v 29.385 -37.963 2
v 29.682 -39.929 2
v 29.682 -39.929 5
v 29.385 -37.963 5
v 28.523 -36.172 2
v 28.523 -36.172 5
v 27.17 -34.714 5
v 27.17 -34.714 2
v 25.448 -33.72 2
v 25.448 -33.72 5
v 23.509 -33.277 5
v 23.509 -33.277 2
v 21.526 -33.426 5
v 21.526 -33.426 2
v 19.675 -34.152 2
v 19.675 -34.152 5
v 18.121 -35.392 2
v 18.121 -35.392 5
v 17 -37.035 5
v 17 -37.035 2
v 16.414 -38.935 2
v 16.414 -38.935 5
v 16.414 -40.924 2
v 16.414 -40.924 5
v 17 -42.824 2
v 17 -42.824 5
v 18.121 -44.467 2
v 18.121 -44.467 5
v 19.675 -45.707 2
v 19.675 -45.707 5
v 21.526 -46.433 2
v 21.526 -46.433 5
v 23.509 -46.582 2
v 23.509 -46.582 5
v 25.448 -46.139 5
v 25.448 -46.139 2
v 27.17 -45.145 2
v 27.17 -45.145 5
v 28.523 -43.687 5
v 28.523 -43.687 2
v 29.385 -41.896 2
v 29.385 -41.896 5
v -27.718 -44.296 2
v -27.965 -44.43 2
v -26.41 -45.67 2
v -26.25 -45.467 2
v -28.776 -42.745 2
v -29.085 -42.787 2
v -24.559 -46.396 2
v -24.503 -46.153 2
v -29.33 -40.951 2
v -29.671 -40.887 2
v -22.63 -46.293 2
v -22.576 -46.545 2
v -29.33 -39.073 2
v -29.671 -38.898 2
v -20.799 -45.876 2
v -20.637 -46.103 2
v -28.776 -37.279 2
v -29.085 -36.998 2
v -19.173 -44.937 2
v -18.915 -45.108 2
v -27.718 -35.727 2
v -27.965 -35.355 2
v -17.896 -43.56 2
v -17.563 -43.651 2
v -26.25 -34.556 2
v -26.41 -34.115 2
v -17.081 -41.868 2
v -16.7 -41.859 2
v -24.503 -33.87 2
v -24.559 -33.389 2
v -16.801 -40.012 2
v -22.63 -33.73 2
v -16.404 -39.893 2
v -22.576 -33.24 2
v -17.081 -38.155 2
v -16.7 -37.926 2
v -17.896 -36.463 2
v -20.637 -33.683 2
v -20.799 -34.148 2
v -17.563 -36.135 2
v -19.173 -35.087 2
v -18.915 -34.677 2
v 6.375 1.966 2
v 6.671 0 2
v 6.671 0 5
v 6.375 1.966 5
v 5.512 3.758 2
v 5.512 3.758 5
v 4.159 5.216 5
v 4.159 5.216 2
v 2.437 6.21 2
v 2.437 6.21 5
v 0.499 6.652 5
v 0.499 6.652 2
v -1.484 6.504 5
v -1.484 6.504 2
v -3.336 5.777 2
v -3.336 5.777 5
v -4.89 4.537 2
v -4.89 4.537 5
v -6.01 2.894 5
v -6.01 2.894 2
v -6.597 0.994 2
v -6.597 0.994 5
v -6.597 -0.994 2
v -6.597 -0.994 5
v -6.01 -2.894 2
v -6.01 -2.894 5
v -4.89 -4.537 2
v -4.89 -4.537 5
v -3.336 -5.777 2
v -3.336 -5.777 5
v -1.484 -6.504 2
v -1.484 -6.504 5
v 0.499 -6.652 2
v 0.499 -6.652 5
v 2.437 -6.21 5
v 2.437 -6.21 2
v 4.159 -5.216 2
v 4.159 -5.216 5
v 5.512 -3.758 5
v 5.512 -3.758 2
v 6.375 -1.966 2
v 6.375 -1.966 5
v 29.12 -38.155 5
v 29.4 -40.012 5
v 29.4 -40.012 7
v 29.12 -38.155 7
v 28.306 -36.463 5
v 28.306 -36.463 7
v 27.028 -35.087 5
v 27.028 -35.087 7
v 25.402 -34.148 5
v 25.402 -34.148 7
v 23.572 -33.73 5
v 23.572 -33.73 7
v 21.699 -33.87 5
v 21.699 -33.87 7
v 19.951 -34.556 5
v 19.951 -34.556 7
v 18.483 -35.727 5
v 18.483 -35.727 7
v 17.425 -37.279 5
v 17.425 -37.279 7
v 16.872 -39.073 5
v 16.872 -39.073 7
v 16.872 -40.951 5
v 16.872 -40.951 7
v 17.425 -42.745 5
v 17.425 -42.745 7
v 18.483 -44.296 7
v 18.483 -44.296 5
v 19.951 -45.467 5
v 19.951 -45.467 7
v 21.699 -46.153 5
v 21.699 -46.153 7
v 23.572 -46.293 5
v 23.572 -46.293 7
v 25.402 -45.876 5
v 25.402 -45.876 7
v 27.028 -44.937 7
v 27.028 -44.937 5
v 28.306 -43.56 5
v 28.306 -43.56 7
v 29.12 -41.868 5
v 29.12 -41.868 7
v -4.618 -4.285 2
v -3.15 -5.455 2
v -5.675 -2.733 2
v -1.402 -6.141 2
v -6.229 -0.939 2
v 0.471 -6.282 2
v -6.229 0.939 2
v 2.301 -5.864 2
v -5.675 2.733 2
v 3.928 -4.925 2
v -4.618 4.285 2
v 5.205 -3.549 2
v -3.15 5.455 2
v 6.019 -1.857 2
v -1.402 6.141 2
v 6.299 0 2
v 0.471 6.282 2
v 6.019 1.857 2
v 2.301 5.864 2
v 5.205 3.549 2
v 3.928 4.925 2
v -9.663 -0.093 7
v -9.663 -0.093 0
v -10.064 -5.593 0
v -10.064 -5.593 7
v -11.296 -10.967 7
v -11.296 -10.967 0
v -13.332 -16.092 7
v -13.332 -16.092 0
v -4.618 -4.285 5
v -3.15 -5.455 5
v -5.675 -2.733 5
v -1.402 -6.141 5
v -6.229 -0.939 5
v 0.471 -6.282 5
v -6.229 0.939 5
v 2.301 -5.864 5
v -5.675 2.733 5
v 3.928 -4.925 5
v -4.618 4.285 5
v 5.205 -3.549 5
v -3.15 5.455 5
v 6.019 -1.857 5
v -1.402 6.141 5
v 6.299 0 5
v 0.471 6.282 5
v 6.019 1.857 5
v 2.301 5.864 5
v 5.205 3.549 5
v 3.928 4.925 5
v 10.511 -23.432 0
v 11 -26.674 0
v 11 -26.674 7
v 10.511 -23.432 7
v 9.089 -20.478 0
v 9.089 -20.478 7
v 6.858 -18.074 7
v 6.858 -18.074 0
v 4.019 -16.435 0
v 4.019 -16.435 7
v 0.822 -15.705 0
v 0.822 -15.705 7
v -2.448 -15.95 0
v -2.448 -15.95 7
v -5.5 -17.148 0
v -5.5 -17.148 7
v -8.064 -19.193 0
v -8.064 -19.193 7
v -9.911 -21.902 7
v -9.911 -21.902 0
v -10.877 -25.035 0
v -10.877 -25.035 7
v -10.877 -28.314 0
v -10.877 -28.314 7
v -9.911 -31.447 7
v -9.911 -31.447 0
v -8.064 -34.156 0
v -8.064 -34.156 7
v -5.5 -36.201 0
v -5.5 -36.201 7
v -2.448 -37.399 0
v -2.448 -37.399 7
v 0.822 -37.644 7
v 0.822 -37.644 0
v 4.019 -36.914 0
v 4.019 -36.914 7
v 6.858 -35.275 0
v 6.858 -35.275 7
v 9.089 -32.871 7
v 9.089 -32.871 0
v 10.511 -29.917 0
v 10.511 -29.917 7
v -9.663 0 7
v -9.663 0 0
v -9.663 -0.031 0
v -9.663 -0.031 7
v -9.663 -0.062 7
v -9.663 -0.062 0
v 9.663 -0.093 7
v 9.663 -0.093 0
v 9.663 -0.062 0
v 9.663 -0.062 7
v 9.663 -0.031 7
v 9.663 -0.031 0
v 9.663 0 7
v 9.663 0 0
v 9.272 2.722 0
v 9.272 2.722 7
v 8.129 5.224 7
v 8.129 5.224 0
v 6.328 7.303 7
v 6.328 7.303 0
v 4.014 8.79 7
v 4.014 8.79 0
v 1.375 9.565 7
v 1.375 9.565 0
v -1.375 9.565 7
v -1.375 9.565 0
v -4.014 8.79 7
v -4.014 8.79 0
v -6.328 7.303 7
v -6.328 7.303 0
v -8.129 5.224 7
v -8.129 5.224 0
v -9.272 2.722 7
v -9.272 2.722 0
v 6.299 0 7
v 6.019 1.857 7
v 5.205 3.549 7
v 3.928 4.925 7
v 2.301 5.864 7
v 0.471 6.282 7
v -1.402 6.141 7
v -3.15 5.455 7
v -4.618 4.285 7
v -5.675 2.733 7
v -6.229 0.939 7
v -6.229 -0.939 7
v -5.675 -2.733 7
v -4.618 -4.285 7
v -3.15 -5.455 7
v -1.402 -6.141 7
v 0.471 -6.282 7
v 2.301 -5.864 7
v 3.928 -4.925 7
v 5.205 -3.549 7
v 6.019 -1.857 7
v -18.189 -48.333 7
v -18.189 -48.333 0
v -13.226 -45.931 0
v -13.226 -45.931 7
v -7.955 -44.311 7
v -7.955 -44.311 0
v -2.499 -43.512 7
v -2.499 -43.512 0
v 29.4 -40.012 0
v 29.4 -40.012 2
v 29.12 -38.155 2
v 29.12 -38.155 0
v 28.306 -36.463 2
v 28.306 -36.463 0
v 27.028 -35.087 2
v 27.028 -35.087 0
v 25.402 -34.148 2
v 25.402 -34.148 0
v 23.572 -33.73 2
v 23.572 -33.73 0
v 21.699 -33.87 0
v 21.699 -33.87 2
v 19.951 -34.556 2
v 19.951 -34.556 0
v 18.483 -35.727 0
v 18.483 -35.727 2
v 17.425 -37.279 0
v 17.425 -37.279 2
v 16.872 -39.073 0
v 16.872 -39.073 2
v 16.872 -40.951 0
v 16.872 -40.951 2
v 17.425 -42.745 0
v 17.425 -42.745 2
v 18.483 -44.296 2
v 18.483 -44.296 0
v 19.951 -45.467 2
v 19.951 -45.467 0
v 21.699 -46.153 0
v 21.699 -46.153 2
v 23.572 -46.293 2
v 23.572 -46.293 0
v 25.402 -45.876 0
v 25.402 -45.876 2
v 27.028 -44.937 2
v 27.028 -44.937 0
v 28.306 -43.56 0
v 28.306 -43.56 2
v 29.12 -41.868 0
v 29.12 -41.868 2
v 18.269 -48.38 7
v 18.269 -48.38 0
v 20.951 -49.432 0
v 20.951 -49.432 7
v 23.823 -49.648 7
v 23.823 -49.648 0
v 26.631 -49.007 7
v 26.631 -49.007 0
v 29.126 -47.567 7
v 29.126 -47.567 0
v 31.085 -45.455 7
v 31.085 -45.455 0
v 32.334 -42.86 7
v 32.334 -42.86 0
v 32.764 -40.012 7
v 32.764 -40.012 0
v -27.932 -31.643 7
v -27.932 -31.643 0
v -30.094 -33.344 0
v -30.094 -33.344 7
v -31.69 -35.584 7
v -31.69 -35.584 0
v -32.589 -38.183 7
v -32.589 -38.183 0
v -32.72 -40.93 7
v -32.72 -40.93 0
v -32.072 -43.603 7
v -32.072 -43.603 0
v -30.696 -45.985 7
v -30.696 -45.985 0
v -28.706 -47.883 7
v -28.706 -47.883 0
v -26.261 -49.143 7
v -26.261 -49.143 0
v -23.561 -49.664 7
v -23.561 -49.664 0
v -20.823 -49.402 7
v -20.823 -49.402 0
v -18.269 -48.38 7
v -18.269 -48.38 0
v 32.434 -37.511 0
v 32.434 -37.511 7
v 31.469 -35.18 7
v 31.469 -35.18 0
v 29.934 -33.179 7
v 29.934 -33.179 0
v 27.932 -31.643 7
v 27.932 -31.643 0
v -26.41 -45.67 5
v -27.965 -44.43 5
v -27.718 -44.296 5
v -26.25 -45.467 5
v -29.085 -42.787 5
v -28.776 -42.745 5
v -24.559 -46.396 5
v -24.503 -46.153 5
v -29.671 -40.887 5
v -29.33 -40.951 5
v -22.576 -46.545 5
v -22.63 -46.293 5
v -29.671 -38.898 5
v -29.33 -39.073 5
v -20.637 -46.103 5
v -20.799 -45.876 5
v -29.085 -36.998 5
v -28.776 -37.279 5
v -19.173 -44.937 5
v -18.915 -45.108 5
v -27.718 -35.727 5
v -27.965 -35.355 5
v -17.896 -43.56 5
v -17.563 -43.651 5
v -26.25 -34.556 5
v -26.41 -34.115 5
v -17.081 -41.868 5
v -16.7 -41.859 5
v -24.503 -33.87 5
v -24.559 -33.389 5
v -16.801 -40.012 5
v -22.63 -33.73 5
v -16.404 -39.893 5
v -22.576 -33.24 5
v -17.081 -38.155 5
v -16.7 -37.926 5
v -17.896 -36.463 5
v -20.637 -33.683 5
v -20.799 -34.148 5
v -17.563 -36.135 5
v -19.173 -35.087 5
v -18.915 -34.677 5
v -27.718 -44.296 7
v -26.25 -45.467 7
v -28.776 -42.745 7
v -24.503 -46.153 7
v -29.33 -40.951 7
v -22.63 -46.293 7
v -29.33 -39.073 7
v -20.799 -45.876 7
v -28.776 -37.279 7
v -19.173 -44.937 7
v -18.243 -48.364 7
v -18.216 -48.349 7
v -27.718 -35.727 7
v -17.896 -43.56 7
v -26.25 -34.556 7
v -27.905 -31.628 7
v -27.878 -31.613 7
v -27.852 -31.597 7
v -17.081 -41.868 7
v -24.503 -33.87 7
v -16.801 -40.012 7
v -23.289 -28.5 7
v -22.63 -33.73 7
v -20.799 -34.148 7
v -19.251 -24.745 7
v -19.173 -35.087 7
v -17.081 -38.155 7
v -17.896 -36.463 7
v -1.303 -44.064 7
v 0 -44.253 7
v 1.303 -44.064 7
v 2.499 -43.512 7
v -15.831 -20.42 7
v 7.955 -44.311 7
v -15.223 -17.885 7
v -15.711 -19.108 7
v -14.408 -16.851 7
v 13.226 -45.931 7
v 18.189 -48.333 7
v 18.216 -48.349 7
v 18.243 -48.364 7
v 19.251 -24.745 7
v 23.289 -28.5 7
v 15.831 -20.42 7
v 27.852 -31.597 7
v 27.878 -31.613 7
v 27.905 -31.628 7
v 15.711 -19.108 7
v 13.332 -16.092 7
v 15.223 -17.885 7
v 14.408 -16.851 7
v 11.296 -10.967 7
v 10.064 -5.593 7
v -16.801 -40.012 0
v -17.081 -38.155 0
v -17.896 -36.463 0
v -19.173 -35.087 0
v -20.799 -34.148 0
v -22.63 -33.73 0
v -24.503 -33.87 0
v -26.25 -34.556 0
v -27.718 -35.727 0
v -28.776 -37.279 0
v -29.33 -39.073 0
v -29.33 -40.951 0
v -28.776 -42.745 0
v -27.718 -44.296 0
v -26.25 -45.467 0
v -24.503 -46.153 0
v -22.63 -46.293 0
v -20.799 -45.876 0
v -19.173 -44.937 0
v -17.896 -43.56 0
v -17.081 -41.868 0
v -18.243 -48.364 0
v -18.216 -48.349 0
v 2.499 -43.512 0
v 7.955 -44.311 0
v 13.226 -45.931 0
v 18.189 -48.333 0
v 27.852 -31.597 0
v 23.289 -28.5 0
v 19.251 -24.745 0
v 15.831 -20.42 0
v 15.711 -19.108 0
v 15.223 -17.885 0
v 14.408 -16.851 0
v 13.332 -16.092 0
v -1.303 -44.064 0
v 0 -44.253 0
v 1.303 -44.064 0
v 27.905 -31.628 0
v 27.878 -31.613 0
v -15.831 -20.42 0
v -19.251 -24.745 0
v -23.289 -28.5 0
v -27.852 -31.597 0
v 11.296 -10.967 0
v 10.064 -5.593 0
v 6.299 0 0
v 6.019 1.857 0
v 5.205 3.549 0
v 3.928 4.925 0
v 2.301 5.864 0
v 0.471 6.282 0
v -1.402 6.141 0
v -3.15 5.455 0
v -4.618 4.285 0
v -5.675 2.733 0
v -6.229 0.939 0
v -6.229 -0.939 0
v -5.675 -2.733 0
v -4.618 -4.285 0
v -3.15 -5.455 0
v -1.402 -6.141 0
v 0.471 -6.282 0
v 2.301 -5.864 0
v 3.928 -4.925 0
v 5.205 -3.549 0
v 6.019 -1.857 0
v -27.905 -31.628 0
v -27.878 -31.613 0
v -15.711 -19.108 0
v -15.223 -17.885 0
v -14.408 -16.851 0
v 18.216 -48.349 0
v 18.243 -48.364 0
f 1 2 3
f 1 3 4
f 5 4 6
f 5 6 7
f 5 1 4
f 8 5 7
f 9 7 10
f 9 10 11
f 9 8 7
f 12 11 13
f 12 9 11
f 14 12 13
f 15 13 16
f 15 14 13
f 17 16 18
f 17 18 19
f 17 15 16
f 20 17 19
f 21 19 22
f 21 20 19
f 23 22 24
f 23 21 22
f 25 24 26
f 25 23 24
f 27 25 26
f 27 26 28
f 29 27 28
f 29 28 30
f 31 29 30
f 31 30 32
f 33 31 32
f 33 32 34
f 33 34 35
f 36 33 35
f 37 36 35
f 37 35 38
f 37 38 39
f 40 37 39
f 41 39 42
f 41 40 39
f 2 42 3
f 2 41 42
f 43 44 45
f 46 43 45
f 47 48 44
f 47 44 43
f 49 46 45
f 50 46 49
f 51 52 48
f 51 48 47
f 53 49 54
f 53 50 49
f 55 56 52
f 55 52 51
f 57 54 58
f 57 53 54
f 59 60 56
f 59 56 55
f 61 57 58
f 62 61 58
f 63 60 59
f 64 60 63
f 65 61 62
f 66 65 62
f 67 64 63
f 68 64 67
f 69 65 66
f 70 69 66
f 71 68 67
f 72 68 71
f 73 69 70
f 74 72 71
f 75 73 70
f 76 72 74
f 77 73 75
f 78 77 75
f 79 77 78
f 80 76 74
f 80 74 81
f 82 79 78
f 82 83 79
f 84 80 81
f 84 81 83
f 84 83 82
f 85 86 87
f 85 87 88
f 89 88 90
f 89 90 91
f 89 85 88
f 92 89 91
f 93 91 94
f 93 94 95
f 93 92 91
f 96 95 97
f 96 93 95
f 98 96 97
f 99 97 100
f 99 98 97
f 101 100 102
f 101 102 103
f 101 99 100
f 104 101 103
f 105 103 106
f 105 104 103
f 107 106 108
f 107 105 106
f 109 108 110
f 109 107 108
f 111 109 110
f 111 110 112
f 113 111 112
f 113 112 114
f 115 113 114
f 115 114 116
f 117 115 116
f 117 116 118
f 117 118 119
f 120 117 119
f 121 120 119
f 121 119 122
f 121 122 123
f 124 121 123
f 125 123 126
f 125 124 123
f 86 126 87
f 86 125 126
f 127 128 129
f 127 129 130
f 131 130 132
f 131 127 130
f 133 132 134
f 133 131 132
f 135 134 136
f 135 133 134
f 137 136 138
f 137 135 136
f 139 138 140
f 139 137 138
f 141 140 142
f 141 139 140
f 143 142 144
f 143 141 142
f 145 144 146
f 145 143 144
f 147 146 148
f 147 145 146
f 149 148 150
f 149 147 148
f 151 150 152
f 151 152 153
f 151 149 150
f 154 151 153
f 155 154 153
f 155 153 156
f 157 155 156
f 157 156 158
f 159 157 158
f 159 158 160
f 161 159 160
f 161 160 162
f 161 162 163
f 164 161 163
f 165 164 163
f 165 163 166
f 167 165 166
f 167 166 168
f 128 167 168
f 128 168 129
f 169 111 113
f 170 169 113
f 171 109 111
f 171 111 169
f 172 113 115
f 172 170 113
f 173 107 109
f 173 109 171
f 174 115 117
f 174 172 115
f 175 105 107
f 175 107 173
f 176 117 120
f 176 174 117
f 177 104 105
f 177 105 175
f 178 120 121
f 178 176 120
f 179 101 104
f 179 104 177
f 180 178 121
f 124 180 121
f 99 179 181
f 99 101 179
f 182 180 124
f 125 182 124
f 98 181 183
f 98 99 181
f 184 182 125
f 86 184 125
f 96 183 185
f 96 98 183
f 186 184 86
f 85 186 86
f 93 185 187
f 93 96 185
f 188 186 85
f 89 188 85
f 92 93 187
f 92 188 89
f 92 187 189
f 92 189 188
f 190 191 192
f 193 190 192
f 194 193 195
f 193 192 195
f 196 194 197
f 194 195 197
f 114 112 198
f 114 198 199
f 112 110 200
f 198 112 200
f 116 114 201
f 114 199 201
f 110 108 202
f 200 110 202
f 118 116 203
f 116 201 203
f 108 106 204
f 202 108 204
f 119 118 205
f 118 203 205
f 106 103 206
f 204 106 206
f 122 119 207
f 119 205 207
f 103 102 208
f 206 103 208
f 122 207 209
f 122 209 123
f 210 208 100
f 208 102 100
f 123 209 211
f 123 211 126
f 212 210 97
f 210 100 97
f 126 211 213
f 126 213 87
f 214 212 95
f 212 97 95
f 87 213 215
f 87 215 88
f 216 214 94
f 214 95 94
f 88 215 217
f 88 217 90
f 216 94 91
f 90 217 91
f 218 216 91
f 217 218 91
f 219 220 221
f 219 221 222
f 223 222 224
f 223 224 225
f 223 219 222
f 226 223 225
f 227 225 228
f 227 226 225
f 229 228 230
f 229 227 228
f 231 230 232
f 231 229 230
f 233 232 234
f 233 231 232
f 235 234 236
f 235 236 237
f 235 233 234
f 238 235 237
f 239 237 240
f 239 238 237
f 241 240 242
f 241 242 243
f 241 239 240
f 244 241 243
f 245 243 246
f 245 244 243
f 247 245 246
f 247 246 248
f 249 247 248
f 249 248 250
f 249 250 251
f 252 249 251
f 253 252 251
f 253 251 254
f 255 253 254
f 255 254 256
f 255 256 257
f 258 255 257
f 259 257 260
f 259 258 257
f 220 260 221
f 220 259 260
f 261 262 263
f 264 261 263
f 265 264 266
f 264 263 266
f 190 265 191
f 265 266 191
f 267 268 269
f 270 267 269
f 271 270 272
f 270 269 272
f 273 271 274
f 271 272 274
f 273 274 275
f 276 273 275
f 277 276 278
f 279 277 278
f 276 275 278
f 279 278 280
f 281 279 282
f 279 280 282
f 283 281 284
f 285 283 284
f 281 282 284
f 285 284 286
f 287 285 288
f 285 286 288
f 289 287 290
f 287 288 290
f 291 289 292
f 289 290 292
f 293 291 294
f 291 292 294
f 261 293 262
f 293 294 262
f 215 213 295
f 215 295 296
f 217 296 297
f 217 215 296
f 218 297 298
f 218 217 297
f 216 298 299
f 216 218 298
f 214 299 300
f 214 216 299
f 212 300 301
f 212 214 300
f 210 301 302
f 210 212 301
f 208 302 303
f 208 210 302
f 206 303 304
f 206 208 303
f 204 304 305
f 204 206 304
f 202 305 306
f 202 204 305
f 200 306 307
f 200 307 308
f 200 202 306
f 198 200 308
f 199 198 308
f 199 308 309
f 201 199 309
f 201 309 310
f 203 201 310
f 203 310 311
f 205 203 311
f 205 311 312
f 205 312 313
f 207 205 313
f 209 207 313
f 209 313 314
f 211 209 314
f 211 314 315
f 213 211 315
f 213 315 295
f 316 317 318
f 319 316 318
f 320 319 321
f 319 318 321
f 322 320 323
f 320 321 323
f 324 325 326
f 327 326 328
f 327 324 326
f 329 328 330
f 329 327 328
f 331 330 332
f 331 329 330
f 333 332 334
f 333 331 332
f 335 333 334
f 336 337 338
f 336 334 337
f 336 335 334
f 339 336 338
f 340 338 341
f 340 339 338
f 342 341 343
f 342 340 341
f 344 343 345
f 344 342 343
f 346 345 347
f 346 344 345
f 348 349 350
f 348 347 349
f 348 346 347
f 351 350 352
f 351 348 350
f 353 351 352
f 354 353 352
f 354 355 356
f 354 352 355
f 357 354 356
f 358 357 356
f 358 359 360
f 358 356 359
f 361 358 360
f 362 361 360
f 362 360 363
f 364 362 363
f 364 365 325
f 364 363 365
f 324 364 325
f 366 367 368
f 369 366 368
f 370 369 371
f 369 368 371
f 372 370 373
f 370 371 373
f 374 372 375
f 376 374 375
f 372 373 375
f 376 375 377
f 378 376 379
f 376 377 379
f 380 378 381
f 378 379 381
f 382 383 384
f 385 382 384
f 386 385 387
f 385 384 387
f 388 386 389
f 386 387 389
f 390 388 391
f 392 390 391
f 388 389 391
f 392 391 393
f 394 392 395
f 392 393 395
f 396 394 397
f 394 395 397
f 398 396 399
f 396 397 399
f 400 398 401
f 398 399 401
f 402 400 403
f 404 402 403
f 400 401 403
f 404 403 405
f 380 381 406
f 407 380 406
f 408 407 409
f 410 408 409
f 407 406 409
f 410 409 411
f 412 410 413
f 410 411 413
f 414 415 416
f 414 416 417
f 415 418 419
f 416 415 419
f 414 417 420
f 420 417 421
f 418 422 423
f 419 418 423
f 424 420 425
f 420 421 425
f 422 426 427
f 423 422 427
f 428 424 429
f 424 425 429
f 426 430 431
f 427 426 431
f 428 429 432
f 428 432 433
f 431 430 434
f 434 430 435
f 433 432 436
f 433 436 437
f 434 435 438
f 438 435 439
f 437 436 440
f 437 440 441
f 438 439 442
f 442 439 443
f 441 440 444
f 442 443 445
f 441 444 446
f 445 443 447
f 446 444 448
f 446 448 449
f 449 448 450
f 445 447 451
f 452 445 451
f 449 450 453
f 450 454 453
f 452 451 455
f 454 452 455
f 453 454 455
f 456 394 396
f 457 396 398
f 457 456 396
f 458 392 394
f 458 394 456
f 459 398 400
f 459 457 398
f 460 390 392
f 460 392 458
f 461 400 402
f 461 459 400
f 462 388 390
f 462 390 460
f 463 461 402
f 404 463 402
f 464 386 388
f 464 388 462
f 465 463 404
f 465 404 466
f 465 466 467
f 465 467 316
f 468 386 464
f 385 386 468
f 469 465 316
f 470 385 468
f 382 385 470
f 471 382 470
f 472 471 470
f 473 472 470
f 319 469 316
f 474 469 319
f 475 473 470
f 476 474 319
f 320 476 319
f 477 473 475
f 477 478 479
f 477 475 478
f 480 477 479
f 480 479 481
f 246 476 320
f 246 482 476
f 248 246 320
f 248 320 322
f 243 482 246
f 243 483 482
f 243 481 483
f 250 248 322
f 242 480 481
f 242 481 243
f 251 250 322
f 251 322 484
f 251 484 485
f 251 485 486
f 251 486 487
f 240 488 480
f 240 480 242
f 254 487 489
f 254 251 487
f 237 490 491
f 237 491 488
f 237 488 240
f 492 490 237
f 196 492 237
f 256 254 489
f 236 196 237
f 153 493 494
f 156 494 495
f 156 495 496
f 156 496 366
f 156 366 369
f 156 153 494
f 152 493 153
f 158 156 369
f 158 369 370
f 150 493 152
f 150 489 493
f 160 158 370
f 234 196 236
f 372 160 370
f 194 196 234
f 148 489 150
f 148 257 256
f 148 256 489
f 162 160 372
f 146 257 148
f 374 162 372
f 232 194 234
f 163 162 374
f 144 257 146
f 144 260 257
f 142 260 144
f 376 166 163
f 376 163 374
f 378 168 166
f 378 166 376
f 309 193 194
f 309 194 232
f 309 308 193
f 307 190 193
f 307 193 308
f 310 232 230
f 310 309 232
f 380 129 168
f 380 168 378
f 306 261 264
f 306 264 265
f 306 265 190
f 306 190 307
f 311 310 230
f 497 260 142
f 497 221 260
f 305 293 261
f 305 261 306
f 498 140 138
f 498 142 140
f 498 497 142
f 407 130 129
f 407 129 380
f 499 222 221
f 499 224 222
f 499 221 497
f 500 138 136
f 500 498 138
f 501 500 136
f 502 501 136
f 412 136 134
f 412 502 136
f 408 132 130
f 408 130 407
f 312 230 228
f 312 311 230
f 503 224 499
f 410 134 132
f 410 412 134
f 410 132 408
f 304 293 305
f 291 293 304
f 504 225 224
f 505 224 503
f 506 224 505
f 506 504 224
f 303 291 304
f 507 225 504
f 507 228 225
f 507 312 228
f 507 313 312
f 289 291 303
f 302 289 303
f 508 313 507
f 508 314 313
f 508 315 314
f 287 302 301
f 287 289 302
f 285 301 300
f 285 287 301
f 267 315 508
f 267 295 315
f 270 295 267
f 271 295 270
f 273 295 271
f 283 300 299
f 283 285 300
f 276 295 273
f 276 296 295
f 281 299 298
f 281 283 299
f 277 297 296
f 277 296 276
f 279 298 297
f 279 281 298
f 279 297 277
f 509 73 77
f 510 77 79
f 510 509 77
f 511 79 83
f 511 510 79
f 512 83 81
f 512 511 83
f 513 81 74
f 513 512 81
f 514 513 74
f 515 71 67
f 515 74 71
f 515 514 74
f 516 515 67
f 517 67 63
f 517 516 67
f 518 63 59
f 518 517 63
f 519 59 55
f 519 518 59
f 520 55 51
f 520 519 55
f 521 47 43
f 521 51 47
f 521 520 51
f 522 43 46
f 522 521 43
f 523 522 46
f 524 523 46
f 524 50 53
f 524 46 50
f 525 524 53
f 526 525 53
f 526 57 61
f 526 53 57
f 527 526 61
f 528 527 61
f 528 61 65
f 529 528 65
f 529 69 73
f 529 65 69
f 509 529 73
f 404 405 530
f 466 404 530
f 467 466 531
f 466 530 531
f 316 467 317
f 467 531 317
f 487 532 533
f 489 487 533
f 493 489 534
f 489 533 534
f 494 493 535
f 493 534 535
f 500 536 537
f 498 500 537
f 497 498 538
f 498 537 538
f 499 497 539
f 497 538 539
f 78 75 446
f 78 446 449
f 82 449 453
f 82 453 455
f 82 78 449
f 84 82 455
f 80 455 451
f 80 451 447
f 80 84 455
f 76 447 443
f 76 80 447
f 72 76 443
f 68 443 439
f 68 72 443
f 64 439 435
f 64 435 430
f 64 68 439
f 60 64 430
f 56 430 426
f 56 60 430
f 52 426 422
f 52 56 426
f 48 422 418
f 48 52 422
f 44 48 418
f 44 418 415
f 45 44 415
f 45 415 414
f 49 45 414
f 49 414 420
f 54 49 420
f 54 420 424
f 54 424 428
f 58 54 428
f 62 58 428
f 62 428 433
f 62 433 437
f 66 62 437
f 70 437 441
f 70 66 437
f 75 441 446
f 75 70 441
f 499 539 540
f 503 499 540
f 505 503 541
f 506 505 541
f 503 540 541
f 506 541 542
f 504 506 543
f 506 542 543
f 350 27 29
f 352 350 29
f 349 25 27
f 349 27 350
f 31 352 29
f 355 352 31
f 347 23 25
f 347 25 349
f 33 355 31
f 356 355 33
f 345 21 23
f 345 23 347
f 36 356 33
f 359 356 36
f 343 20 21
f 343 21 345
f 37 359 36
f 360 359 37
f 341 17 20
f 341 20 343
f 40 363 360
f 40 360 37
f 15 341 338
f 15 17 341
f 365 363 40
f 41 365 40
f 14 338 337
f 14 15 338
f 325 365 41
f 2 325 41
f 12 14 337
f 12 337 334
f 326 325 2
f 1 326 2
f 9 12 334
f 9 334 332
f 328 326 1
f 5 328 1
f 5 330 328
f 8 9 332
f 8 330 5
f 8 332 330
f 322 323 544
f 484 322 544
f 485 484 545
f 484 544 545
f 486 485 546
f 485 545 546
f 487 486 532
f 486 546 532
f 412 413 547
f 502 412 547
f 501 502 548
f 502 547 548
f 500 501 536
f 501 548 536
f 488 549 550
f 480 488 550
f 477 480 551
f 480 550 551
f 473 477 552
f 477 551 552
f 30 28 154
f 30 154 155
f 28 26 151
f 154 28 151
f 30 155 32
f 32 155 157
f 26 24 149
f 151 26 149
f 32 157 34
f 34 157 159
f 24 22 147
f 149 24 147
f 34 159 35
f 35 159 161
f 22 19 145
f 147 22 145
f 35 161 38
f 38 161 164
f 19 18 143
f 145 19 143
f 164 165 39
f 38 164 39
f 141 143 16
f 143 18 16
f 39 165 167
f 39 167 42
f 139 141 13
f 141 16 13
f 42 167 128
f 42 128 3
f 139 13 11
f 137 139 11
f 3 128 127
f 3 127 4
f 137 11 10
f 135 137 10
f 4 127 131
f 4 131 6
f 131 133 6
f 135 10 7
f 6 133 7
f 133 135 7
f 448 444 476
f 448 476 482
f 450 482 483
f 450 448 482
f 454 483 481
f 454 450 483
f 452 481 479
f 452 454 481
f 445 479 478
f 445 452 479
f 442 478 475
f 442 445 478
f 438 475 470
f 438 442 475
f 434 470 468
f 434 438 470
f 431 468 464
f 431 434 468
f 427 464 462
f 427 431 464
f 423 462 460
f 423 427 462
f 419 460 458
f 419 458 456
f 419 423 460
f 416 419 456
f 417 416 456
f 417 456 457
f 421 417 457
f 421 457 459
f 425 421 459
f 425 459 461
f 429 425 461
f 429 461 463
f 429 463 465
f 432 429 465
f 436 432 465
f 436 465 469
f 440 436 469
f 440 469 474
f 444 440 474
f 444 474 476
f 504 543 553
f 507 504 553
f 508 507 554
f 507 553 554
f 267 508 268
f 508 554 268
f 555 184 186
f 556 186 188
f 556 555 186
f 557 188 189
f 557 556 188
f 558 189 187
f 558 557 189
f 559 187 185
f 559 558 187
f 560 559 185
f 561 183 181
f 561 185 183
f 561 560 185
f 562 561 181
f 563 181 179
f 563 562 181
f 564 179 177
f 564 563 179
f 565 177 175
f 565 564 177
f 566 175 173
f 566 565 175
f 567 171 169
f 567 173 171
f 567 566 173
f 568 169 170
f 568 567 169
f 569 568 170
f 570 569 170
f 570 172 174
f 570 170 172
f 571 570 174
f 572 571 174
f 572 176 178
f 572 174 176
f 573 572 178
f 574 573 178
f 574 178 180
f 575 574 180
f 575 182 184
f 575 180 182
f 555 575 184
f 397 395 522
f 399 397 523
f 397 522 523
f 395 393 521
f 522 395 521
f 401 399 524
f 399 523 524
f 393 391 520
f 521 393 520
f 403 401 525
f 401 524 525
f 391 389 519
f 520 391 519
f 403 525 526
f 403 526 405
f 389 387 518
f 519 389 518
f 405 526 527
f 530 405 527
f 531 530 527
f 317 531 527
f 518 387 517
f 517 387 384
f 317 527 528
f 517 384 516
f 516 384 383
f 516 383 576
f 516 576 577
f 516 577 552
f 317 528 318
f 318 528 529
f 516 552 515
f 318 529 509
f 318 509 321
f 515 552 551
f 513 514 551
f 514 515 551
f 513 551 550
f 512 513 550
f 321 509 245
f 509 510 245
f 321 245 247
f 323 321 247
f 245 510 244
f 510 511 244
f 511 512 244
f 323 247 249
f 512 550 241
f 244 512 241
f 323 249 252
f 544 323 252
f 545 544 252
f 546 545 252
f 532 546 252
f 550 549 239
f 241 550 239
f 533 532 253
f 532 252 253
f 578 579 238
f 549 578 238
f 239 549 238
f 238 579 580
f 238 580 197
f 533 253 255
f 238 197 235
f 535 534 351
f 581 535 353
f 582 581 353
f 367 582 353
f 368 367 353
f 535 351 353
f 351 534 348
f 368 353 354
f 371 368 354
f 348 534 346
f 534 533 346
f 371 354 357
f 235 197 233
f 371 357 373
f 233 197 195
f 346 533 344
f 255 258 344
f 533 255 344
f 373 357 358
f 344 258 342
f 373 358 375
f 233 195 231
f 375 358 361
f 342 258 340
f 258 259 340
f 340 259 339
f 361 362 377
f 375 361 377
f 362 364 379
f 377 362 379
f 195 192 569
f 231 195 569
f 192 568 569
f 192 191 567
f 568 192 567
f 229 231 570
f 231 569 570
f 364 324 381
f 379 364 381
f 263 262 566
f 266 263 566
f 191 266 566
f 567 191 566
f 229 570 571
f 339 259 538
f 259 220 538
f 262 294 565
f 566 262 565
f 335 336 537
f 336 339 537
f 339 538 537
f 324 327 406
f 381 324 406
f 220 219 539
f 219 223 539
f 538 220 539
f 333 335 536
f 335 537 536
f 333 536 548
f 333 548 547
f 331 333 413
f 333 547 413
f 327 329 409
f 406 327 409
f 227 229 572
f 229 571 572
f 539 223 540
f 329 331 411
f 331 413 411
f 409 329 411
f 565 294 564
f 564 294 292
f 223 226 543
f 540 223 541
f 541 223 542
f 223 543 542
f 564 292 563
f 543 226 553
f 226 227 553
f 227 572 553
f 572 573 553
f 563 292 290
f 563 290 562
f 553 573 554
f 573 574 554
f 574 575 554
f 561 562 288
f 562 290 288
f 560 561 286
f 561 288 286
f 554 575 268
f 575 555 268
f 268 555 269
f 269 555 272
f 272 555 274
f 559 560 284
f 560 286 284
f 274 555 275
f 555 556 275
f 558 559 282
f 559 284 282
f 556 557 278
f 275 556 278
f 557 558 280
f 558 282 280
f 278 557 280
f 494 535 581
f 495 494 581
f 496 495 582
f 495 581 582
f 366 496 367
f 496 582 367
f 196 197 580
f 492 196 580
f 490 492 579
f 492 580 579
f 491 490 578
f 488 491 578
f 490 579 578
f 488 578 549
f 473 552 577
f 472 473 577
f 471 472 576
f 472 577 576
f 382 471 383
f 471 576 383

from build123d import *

# Parameters (mm, degrees)
F0_R     = 6.2993
F0_R_2   = 11
F1_DEPTH = 7
F4_R     = 6.6710532067
F5_DEPTH = 3


# Not quite as in the source:
# - ends of sketch curves that miss each other by under 0.0002 mm in the source are joined
# - a feature names something its author has since deleted; it is built from what else it names


with BuildPart() as f1:
    # F0 (on Top) → F1 (new body)
    with BuildSketch(Plane.XY):
        with BuildLine():
            ThreePointArc((9.6625090534, -0.0929069647), (9.6627025372, -0.0464533389), (9.6629557026, 0))
            ThreePointArc((9.6629557026, 0), (0, 9.6629557026), (-9.6629557026, 0))
            ThreePointArc((-9.6629557026, 0), (-9.662702535, -0.0464535369), (-9.6625090496, -0.0929073607))
            ThreePointArc((-9.6625090496, -0.0929073607), (1.98e-07, -9.6629557026), (9.6625090534, -0.0929069647))
        make_face()
        Circle(F0_R, mode=Mode.SUBTRACT)
        with BuildLine():
            ThreePointArc((-13.4378241011, -40.0117243144), (-18.2291272521, -31.6666830127), (-27.8515741938, -31.5972923328))
            ThreePointArc((-27.8515741938, -31.5972923328), (-27.8919011281, -31.6203516814), (-27.9322576549, -31.6433592003))
            ThreePointArc((-27.9322576549, -31.6433592003), (-31.4691449177, -44.8432021657), (-18.2693019524, -48.3800894285))
            ThreePointArc((-18.2693019524, -48.3800894285), (-18.2291987635, -48.3566435113), (-18.1890654853, -48.3332491365))
            ThreePointArc((-18.1890654853, -48.3332491365), (-14.7092843829, -44.8029159735), (-13.4378241011, -40.0117243144))
        make_face()
        with Locations((-23.1007798037, -40.0117243144)):
            Circle(F0_R, mode=Mode.SUBTRACT)
        with BuildLine():
            ThreePointArc((27.9322576549, -31.6433592003), (27.8919013007, -31.6203517785), (27.8515745387, -31.5972925275))
            ThreePointArc((27.8515745387, -31.5972925275), (14.7324146896, -35.1802464631), (18.1890654853, -48.3332491365))
            ThreePointArc((18.1890654853, -48.3332491365), (18.2291987635, -48.3566435113), (18.2693019524, -48.3800894285))
            ThreePointArc((18.2693019524, -48.3800894285), (27.9322576549, -48.3800894285), (32.7637355062, -40.0117243144))
            ThreePointArc((32.7637355062, -40.0117243144), (31.4691449177, -35.1802464631), (27.9322576549, -31.6433592003))
        make_face()
        with Locations((23.1007798037, -40.0117243144)):
            Circle(F0_R, mode=Mode.SUBTRACT)
        with BuildLine():
            ThreePointArc((13.3320983645, -16.0921664972), (10.5773906807, -8.3035279339), (9.6625090534, -0.0929069647))
            ThreePointArc((9.6625090534, -0.0929069647), (1.98e-07, -9.6629557026), (-9.6625090496, -0.0929073607))
            ThreePointArc((-9.6625090496, -0.0929073607), (-10.5773905595, -8.3035281796), (-13.3320981392, -16.0921666073))
            ThreePointArc((-13.3320981392, -16.0921666073), (-14.506503102, -18.2991494053), (-15.8306037894, -20.4197053365))
            ThreePointArc((-15.8306037894, -20.4197053365), (-21.1984087389, -26.6996712943), (-27.8515741938, -31.5972923328))
            ThreePointArc((-27.8515741938, -31.5972923328), (-18.2291272521, -31.6666830127), (-13.4378241011, -40.0117243144))
            ThreePointArc((-13.4378241011, -40.0117243144), (-14.7092843829, -44.8029159735), (-18.1890654853, -48.3332491365))
            ThreePointArc((-18.1890654853, -48.3332491365), (-10.6210183315, -45.0202493827), (-2.4985056329, -43.5115769352))
            ThreePointArc((-2.4985056329, -43.5115769352), (0, -43.4251500733), (2.4985056329, -43.5115769352))
            ThreePointArc((2.4985056329, -43.5115769352), (10.6210183315, -45.0202493827), (18.1890654853, -48.3332491365))
            ThreePointArc((18.1890654853, -48.3332491365), (14.7324146896, -35.1802464631), (27.8515745387, -31.5972925275))
            ThreePointArc((27.8515745387, -31.5972925275), (21.1984090122, -26.6996713122), (15.8306039974, -20.4197051964))
            ThreePointArc((15.8306039974, -20.4197051964), (14.506503323, -18.2991492777), (13.3320983645, -16.0921664972))
        make_face()
        with Locations((0, -26.6744828763)):
            Circle(F0_R_2, mode=Mode.SUBTRACT)
        with BuildLine():
            ThreePointArc((15.8306039974, -20.4197051964), (15.223256939, -17.8853313846), (13.3320983645, -16.0921664972))
            ThreePointArc((13.3320983645, -16.0921664972), (14.506503323, -18.2991492777), (15.8306039974, -20.4197051964))
        make_face()
        with BuildLine():
            ThreePointArc((-15.8306037894, -20.4197053365), (-14.506503102, -18.2991494053), (-13.3320981392, -16.0921666073))
            ThreePointArc((-13.3320981392, -16.0921666073), (-15.223256939, -17.8853313846), (-15.8306037894, -20.4197053365))
        make_face()
        with BuildLine():
            ThreePointArc((-2.4985056329, -43.5115769352), (0, -44.2527858596), (2.4985056329, -43.5115769352))
            ThreePointArc((2.4985056329, -43.5115769352), (0, -43.4251500733), (-2.4985056329, -43.5115769352))
        make_face()
    extrude(amount=F1_DEPTH)

    # F4 (on line) → F5 (cut)
    with BuildSketch(Plane.XY.offset(2)):
        Circle(F4_R)
        with Locations((-23.0745827089, -39.8926408961)):
            Circle(F4_R)
        with Locations((23.0107490857, -39.9294952557)):
            Circle(F4_R)
    extrude(amount=F5_DEPTH, mode=Mode.SUBTRACT)


solid = f1.part
